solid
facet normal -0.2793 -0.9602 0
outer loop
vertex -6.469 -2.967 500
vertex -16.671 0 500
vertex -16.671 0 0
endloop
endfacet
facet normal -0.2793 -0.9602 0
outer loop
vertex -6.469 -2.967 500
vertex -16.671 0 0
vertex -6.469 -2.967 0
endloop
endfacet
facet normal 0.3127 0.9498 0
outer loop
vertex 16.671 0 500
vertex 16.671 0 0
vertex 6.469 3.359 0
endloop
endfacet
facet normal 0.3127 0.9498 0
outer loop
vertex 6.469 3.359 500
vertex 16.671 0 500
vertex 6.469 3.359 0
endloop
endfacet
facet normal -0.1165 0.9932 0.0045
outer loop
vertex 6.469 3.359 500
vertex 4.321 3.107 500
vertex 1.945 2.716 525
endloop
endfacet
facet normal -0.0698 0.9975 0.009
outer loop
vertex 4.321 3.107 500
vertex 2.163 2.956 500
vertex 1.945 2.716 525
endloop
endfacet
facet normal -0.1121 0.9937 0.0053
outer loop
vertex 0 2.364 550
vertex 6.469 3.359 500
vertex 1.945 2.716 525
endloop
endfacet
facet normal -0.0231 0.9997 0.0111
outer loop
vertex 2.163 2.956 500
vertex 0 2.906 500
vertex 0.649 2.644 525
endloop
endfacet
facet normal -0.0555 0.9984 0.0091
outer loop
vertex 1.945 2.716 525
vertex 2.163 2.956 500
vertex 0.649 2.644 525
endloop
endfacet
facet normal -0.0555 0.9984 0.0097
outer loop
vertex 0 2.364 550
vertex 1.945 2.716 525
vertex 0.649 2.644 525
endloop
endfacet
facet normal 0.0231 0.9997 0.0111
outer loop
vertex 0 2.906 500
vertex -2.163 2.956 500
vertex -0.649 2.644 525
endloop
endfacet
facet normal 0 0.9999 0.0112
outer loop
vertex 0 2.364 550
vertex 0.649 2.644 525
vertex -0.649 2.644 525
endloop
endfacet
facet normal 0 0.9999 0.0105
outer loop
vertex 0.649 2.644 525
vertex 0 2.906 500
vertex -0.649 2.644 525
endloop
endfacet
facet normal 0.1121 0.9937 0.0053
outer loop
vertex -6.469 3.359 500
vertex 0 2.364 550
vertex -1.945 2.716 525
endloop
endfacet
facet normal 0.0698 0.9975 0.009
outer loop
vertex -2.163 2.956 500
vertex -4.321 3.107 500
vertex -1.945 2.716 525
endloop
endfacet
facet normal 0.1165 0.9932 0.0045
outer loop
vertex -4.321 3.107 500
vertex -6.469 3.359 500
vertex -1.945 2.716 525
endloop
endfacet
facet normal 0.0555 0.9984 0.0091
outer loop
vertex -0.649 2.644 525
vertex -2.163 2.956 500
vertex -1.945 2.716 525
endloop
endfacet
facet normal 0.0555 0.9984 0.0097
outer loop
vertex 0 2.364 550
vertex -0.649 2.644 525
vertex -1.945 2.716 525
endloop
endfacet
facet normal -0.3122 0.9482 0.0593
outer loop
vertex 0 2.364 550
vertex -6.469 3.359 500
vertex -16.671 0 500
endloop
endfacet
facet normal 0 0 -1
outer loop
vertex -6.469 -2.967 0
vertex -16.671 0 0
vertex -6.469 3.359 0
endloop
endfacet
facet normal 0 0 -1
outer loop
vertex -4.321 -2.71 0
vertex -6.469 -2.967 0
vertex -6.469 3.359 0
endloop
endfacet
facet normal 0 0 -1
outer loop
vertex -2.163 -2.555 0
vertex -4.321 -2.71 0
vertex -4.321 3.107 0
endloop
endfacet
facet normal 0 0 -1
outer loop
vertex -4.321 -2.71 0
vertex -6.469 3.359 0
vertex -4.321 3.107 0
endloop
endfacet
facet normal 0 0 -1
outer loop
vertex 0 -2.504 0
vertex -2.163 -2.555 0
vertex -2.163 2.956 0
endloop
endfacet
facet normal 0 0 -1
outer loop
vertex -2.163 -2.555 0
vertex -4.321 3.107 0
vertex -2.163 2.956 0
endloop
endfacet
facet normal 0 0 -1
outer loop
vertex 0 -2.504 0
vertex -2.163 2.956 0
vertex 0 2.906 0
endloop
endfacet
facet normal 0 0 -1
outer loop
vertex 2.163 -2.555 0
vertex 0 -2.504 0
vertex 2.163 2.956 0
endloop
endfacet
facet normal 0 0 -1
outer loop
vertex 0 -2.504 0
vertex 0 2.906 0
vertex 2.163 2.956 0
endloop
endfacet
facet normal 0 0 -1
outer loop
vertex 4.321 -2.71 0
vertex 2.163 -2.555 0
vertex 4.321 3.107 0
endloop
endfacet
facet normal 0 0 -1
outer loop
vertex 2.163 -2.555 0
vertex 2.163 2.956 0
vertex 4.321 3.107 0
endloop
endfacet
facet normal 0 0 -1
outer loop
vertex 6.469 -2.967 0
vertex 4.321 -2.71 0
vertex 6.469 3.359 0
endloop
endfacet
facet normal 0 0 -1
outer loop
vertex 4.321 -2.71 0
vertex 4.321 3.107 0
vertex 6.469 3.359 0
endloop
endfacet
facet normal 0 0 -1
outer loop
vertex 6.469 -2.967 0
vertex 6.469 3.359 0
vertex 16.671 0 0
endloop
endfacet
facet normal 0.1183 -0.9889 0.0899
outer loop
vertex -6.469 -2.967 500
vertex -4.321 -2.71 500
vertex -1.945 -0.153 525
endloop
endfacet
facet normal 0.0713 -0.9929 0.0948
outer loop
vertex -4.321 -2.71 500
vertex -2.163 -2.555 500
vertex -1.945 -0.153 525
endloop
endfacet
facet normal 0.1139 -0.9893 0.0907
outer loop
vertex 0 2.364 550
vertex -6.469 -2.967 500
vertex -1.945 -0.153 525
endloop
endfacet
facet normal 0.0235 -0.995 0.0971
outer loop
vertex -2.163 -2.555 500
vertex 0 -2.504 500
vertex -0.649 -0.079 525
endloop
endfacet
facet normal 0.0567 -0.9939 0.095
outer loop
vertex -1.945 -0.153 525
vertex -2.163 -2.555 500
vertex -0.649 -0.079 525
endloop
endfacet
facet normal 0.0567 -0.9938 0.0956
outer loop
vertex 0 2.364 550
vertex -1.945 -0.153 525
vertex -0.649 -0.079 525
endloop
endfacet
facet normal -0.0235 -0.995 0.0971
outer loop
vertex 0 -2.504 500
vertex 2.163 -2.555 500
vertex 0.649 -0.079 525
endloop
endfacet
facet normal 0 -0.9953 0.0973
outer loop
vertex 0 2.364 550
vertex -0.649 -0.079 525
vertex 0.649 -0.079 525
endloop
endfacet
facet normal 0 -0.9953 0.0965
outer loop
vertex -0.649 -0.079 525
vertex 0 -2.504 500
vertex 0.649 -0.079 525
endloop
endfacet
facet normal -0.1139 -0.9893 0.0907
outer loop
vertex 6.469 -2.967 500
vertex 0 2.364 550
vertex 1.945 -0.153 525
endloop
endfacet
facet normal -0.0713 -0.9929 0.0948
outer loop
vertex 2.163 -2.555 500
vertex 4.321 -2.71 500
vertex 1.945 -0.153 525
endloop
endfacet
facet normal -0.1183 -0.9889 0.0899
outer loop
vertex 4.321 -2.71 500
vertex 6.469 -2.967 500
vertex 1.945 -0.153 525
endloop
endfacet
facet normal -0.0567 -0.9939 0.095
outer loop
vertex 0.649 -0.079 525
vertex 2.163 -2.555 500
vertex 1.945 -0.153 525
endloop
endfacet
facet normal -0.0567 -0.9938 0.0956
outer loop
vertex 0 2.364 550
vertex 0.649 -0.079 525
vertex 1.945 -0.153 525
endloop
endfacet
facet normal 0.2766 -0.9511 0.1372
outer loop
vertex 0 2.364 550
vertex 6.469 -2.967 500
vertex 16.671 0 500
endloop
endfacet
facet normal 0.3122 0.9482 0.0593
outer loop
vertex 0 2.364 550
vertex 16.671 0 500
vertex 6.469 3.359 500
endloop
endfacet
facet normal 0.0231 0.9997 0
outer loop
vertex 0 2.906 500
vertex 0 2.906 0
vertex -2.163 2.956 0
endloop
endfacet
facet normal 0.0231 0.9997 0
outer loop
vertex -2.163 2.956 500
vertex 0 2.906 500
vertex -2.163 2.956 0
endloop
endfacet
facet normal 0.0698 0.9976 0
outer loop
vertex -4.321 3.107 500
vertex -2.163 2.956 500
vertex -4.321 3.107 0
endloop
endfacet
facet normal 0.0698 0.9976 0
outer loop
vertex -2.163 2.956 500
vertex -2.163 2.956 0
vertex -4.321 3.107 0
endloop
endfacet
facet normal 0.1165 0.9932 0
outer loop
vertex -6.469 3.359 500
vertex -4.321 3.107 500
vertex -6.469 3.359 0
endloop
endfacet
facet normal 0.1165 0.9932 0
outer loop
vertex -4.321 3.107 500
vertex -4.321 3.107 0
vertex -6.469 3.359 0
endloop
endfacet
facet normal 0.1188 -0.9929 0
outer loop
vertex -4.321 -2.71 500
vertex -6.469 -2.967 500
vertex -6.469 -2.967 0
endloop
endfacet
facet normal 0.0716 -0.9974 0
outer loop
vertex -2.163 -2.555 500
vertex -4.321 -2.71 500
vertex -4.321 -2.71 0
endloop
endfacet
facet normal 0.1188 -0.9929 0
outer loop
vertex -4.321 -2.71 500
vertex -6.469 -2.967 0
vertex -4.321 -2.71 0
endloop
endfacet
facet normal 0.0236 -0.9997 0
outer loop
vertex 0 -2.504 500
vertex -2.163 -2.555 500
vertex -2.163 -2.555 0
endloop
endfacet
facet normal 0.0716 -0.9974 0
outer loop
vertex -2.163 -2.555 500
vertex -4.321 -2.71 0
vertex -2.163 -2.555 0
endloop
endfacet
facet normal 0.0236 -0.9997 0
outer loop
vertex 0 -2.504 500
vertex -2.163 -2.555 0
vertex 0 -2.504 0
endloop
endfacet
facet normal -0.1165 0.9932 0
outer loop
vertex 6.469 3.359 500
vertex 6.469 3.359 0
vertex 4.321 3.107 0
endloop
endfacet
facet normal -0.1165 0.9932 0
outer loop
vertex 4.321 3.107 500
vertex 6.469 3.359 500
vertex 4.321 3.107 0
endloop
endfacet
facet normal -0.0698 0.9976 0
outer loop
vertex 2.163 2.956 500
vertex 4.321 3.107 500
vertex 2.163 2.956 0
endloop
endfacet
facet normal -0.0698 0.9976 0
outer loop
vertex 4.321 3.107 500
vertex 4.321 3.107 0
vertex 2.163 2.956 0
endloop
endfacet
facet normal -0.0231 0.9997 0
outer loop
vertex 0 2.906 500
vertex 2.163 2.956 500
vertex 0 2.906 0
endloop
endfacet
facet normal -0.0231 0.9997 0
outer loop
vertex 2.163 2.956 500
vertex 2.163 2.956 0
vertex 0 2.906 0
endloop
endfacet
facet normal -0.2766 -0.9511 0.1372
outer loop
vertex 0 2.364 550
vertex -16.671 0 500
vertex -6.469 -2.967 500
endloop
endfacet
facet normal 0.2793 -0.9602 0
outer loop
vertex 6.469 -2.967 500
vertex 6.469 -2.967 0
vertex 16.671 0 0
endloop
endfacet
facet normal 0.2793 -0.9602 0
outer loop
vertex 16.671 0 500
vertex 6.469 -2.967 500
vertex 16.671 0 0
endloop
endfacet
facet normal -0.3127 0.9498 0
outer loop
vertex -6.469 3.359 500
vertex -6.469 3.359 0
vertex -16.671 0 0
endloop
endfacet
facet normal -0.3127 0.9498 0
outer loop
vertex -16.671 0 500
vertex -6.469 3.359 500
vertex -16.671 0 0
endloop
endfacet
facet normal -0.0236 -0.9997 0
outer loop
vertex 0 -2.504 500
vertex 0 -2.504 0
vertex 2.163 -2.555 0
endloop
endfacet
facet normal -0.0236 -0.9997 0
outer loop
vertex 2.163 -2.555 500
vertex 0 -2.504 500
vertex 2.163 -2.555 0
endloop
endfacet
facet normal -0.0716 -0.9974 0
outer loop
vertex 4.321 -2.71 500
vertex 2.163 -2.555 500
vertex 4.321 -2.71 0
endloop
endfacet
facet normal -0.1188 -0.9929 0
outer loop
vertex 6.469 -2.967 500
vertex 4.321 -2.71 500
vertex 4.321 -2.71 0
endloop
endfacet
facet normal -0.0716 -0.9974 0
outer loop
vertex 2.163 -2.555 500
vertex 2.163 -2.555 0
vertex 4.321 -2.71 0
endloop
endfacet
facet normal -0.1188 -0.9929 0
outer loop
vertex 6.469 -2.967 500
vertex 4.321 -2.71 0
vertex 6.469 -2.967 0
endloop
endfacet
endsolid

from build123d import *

# Parameters (mm, degrees)
F1_DEPTH = 500


with BuildPart() as f1:
    # F0 (on Top) → F1 (new body)
    with BuildSketch(Plane.XY):
        with BuildLine():
            Line((-6.469195, 3.359005), (-16.670616, 0))
            Line((-16.670616, 0), (-6.469195, -2.966833))
            ThreePointArc((-6.469195, -2.966833), (-3.242872, -2.619714), (0, -2.50381))
            Line((0, -2.50381), (0, 2.905908))
            ThreePointArc((0, 2.905908), (-3.242521, 3.019321), (-6.469195, 3.359005))
        make_face()
        with BuildLine():
            ThreePointArc((6.469195, 3.359005), (3.242521, 3.019321), (0, 2.905908))
            Line((0, 2.905908), (0, -2.50381))
            ThreePointArc((0, -2.50381), (3.242872, -2.619714), (6.469195, -2.966833))
            Line((6.469195, -2.966833), (16.670616, 0))
            Line((16.670616, 0), (6.469195, 3.359005))
        make_face()
    extrude(amount=F1_DEPTH)

    # F2 (on face) → F5 section 0
    with BuildSketch(Plane.XY.offset(500), mode=Mode.PRIVATE) as f5_s0:
        with BuildLine():
            Line((16.670616, 0), (6.469195, 3.359005))
            ThreePointArc((6.469195, 3.359005), (0, 2.905908), (-6.469195, 3.359005))
            Line((-6.469195, 3.359005), (-16.670616, 0))
            Line((-16.670616, 0), (-6.469195, -2.966833))
            ThreePointArc((-6.469195, -2.966833), (0, -2.50381), (6.469195, -2.966833))
            Line((6.469195, -2.966833), (16.670616, 0))
        make_face()
    loft([Vertex(0, 2.363744, 550), f5_s0.sketch])


solid = f1.part
